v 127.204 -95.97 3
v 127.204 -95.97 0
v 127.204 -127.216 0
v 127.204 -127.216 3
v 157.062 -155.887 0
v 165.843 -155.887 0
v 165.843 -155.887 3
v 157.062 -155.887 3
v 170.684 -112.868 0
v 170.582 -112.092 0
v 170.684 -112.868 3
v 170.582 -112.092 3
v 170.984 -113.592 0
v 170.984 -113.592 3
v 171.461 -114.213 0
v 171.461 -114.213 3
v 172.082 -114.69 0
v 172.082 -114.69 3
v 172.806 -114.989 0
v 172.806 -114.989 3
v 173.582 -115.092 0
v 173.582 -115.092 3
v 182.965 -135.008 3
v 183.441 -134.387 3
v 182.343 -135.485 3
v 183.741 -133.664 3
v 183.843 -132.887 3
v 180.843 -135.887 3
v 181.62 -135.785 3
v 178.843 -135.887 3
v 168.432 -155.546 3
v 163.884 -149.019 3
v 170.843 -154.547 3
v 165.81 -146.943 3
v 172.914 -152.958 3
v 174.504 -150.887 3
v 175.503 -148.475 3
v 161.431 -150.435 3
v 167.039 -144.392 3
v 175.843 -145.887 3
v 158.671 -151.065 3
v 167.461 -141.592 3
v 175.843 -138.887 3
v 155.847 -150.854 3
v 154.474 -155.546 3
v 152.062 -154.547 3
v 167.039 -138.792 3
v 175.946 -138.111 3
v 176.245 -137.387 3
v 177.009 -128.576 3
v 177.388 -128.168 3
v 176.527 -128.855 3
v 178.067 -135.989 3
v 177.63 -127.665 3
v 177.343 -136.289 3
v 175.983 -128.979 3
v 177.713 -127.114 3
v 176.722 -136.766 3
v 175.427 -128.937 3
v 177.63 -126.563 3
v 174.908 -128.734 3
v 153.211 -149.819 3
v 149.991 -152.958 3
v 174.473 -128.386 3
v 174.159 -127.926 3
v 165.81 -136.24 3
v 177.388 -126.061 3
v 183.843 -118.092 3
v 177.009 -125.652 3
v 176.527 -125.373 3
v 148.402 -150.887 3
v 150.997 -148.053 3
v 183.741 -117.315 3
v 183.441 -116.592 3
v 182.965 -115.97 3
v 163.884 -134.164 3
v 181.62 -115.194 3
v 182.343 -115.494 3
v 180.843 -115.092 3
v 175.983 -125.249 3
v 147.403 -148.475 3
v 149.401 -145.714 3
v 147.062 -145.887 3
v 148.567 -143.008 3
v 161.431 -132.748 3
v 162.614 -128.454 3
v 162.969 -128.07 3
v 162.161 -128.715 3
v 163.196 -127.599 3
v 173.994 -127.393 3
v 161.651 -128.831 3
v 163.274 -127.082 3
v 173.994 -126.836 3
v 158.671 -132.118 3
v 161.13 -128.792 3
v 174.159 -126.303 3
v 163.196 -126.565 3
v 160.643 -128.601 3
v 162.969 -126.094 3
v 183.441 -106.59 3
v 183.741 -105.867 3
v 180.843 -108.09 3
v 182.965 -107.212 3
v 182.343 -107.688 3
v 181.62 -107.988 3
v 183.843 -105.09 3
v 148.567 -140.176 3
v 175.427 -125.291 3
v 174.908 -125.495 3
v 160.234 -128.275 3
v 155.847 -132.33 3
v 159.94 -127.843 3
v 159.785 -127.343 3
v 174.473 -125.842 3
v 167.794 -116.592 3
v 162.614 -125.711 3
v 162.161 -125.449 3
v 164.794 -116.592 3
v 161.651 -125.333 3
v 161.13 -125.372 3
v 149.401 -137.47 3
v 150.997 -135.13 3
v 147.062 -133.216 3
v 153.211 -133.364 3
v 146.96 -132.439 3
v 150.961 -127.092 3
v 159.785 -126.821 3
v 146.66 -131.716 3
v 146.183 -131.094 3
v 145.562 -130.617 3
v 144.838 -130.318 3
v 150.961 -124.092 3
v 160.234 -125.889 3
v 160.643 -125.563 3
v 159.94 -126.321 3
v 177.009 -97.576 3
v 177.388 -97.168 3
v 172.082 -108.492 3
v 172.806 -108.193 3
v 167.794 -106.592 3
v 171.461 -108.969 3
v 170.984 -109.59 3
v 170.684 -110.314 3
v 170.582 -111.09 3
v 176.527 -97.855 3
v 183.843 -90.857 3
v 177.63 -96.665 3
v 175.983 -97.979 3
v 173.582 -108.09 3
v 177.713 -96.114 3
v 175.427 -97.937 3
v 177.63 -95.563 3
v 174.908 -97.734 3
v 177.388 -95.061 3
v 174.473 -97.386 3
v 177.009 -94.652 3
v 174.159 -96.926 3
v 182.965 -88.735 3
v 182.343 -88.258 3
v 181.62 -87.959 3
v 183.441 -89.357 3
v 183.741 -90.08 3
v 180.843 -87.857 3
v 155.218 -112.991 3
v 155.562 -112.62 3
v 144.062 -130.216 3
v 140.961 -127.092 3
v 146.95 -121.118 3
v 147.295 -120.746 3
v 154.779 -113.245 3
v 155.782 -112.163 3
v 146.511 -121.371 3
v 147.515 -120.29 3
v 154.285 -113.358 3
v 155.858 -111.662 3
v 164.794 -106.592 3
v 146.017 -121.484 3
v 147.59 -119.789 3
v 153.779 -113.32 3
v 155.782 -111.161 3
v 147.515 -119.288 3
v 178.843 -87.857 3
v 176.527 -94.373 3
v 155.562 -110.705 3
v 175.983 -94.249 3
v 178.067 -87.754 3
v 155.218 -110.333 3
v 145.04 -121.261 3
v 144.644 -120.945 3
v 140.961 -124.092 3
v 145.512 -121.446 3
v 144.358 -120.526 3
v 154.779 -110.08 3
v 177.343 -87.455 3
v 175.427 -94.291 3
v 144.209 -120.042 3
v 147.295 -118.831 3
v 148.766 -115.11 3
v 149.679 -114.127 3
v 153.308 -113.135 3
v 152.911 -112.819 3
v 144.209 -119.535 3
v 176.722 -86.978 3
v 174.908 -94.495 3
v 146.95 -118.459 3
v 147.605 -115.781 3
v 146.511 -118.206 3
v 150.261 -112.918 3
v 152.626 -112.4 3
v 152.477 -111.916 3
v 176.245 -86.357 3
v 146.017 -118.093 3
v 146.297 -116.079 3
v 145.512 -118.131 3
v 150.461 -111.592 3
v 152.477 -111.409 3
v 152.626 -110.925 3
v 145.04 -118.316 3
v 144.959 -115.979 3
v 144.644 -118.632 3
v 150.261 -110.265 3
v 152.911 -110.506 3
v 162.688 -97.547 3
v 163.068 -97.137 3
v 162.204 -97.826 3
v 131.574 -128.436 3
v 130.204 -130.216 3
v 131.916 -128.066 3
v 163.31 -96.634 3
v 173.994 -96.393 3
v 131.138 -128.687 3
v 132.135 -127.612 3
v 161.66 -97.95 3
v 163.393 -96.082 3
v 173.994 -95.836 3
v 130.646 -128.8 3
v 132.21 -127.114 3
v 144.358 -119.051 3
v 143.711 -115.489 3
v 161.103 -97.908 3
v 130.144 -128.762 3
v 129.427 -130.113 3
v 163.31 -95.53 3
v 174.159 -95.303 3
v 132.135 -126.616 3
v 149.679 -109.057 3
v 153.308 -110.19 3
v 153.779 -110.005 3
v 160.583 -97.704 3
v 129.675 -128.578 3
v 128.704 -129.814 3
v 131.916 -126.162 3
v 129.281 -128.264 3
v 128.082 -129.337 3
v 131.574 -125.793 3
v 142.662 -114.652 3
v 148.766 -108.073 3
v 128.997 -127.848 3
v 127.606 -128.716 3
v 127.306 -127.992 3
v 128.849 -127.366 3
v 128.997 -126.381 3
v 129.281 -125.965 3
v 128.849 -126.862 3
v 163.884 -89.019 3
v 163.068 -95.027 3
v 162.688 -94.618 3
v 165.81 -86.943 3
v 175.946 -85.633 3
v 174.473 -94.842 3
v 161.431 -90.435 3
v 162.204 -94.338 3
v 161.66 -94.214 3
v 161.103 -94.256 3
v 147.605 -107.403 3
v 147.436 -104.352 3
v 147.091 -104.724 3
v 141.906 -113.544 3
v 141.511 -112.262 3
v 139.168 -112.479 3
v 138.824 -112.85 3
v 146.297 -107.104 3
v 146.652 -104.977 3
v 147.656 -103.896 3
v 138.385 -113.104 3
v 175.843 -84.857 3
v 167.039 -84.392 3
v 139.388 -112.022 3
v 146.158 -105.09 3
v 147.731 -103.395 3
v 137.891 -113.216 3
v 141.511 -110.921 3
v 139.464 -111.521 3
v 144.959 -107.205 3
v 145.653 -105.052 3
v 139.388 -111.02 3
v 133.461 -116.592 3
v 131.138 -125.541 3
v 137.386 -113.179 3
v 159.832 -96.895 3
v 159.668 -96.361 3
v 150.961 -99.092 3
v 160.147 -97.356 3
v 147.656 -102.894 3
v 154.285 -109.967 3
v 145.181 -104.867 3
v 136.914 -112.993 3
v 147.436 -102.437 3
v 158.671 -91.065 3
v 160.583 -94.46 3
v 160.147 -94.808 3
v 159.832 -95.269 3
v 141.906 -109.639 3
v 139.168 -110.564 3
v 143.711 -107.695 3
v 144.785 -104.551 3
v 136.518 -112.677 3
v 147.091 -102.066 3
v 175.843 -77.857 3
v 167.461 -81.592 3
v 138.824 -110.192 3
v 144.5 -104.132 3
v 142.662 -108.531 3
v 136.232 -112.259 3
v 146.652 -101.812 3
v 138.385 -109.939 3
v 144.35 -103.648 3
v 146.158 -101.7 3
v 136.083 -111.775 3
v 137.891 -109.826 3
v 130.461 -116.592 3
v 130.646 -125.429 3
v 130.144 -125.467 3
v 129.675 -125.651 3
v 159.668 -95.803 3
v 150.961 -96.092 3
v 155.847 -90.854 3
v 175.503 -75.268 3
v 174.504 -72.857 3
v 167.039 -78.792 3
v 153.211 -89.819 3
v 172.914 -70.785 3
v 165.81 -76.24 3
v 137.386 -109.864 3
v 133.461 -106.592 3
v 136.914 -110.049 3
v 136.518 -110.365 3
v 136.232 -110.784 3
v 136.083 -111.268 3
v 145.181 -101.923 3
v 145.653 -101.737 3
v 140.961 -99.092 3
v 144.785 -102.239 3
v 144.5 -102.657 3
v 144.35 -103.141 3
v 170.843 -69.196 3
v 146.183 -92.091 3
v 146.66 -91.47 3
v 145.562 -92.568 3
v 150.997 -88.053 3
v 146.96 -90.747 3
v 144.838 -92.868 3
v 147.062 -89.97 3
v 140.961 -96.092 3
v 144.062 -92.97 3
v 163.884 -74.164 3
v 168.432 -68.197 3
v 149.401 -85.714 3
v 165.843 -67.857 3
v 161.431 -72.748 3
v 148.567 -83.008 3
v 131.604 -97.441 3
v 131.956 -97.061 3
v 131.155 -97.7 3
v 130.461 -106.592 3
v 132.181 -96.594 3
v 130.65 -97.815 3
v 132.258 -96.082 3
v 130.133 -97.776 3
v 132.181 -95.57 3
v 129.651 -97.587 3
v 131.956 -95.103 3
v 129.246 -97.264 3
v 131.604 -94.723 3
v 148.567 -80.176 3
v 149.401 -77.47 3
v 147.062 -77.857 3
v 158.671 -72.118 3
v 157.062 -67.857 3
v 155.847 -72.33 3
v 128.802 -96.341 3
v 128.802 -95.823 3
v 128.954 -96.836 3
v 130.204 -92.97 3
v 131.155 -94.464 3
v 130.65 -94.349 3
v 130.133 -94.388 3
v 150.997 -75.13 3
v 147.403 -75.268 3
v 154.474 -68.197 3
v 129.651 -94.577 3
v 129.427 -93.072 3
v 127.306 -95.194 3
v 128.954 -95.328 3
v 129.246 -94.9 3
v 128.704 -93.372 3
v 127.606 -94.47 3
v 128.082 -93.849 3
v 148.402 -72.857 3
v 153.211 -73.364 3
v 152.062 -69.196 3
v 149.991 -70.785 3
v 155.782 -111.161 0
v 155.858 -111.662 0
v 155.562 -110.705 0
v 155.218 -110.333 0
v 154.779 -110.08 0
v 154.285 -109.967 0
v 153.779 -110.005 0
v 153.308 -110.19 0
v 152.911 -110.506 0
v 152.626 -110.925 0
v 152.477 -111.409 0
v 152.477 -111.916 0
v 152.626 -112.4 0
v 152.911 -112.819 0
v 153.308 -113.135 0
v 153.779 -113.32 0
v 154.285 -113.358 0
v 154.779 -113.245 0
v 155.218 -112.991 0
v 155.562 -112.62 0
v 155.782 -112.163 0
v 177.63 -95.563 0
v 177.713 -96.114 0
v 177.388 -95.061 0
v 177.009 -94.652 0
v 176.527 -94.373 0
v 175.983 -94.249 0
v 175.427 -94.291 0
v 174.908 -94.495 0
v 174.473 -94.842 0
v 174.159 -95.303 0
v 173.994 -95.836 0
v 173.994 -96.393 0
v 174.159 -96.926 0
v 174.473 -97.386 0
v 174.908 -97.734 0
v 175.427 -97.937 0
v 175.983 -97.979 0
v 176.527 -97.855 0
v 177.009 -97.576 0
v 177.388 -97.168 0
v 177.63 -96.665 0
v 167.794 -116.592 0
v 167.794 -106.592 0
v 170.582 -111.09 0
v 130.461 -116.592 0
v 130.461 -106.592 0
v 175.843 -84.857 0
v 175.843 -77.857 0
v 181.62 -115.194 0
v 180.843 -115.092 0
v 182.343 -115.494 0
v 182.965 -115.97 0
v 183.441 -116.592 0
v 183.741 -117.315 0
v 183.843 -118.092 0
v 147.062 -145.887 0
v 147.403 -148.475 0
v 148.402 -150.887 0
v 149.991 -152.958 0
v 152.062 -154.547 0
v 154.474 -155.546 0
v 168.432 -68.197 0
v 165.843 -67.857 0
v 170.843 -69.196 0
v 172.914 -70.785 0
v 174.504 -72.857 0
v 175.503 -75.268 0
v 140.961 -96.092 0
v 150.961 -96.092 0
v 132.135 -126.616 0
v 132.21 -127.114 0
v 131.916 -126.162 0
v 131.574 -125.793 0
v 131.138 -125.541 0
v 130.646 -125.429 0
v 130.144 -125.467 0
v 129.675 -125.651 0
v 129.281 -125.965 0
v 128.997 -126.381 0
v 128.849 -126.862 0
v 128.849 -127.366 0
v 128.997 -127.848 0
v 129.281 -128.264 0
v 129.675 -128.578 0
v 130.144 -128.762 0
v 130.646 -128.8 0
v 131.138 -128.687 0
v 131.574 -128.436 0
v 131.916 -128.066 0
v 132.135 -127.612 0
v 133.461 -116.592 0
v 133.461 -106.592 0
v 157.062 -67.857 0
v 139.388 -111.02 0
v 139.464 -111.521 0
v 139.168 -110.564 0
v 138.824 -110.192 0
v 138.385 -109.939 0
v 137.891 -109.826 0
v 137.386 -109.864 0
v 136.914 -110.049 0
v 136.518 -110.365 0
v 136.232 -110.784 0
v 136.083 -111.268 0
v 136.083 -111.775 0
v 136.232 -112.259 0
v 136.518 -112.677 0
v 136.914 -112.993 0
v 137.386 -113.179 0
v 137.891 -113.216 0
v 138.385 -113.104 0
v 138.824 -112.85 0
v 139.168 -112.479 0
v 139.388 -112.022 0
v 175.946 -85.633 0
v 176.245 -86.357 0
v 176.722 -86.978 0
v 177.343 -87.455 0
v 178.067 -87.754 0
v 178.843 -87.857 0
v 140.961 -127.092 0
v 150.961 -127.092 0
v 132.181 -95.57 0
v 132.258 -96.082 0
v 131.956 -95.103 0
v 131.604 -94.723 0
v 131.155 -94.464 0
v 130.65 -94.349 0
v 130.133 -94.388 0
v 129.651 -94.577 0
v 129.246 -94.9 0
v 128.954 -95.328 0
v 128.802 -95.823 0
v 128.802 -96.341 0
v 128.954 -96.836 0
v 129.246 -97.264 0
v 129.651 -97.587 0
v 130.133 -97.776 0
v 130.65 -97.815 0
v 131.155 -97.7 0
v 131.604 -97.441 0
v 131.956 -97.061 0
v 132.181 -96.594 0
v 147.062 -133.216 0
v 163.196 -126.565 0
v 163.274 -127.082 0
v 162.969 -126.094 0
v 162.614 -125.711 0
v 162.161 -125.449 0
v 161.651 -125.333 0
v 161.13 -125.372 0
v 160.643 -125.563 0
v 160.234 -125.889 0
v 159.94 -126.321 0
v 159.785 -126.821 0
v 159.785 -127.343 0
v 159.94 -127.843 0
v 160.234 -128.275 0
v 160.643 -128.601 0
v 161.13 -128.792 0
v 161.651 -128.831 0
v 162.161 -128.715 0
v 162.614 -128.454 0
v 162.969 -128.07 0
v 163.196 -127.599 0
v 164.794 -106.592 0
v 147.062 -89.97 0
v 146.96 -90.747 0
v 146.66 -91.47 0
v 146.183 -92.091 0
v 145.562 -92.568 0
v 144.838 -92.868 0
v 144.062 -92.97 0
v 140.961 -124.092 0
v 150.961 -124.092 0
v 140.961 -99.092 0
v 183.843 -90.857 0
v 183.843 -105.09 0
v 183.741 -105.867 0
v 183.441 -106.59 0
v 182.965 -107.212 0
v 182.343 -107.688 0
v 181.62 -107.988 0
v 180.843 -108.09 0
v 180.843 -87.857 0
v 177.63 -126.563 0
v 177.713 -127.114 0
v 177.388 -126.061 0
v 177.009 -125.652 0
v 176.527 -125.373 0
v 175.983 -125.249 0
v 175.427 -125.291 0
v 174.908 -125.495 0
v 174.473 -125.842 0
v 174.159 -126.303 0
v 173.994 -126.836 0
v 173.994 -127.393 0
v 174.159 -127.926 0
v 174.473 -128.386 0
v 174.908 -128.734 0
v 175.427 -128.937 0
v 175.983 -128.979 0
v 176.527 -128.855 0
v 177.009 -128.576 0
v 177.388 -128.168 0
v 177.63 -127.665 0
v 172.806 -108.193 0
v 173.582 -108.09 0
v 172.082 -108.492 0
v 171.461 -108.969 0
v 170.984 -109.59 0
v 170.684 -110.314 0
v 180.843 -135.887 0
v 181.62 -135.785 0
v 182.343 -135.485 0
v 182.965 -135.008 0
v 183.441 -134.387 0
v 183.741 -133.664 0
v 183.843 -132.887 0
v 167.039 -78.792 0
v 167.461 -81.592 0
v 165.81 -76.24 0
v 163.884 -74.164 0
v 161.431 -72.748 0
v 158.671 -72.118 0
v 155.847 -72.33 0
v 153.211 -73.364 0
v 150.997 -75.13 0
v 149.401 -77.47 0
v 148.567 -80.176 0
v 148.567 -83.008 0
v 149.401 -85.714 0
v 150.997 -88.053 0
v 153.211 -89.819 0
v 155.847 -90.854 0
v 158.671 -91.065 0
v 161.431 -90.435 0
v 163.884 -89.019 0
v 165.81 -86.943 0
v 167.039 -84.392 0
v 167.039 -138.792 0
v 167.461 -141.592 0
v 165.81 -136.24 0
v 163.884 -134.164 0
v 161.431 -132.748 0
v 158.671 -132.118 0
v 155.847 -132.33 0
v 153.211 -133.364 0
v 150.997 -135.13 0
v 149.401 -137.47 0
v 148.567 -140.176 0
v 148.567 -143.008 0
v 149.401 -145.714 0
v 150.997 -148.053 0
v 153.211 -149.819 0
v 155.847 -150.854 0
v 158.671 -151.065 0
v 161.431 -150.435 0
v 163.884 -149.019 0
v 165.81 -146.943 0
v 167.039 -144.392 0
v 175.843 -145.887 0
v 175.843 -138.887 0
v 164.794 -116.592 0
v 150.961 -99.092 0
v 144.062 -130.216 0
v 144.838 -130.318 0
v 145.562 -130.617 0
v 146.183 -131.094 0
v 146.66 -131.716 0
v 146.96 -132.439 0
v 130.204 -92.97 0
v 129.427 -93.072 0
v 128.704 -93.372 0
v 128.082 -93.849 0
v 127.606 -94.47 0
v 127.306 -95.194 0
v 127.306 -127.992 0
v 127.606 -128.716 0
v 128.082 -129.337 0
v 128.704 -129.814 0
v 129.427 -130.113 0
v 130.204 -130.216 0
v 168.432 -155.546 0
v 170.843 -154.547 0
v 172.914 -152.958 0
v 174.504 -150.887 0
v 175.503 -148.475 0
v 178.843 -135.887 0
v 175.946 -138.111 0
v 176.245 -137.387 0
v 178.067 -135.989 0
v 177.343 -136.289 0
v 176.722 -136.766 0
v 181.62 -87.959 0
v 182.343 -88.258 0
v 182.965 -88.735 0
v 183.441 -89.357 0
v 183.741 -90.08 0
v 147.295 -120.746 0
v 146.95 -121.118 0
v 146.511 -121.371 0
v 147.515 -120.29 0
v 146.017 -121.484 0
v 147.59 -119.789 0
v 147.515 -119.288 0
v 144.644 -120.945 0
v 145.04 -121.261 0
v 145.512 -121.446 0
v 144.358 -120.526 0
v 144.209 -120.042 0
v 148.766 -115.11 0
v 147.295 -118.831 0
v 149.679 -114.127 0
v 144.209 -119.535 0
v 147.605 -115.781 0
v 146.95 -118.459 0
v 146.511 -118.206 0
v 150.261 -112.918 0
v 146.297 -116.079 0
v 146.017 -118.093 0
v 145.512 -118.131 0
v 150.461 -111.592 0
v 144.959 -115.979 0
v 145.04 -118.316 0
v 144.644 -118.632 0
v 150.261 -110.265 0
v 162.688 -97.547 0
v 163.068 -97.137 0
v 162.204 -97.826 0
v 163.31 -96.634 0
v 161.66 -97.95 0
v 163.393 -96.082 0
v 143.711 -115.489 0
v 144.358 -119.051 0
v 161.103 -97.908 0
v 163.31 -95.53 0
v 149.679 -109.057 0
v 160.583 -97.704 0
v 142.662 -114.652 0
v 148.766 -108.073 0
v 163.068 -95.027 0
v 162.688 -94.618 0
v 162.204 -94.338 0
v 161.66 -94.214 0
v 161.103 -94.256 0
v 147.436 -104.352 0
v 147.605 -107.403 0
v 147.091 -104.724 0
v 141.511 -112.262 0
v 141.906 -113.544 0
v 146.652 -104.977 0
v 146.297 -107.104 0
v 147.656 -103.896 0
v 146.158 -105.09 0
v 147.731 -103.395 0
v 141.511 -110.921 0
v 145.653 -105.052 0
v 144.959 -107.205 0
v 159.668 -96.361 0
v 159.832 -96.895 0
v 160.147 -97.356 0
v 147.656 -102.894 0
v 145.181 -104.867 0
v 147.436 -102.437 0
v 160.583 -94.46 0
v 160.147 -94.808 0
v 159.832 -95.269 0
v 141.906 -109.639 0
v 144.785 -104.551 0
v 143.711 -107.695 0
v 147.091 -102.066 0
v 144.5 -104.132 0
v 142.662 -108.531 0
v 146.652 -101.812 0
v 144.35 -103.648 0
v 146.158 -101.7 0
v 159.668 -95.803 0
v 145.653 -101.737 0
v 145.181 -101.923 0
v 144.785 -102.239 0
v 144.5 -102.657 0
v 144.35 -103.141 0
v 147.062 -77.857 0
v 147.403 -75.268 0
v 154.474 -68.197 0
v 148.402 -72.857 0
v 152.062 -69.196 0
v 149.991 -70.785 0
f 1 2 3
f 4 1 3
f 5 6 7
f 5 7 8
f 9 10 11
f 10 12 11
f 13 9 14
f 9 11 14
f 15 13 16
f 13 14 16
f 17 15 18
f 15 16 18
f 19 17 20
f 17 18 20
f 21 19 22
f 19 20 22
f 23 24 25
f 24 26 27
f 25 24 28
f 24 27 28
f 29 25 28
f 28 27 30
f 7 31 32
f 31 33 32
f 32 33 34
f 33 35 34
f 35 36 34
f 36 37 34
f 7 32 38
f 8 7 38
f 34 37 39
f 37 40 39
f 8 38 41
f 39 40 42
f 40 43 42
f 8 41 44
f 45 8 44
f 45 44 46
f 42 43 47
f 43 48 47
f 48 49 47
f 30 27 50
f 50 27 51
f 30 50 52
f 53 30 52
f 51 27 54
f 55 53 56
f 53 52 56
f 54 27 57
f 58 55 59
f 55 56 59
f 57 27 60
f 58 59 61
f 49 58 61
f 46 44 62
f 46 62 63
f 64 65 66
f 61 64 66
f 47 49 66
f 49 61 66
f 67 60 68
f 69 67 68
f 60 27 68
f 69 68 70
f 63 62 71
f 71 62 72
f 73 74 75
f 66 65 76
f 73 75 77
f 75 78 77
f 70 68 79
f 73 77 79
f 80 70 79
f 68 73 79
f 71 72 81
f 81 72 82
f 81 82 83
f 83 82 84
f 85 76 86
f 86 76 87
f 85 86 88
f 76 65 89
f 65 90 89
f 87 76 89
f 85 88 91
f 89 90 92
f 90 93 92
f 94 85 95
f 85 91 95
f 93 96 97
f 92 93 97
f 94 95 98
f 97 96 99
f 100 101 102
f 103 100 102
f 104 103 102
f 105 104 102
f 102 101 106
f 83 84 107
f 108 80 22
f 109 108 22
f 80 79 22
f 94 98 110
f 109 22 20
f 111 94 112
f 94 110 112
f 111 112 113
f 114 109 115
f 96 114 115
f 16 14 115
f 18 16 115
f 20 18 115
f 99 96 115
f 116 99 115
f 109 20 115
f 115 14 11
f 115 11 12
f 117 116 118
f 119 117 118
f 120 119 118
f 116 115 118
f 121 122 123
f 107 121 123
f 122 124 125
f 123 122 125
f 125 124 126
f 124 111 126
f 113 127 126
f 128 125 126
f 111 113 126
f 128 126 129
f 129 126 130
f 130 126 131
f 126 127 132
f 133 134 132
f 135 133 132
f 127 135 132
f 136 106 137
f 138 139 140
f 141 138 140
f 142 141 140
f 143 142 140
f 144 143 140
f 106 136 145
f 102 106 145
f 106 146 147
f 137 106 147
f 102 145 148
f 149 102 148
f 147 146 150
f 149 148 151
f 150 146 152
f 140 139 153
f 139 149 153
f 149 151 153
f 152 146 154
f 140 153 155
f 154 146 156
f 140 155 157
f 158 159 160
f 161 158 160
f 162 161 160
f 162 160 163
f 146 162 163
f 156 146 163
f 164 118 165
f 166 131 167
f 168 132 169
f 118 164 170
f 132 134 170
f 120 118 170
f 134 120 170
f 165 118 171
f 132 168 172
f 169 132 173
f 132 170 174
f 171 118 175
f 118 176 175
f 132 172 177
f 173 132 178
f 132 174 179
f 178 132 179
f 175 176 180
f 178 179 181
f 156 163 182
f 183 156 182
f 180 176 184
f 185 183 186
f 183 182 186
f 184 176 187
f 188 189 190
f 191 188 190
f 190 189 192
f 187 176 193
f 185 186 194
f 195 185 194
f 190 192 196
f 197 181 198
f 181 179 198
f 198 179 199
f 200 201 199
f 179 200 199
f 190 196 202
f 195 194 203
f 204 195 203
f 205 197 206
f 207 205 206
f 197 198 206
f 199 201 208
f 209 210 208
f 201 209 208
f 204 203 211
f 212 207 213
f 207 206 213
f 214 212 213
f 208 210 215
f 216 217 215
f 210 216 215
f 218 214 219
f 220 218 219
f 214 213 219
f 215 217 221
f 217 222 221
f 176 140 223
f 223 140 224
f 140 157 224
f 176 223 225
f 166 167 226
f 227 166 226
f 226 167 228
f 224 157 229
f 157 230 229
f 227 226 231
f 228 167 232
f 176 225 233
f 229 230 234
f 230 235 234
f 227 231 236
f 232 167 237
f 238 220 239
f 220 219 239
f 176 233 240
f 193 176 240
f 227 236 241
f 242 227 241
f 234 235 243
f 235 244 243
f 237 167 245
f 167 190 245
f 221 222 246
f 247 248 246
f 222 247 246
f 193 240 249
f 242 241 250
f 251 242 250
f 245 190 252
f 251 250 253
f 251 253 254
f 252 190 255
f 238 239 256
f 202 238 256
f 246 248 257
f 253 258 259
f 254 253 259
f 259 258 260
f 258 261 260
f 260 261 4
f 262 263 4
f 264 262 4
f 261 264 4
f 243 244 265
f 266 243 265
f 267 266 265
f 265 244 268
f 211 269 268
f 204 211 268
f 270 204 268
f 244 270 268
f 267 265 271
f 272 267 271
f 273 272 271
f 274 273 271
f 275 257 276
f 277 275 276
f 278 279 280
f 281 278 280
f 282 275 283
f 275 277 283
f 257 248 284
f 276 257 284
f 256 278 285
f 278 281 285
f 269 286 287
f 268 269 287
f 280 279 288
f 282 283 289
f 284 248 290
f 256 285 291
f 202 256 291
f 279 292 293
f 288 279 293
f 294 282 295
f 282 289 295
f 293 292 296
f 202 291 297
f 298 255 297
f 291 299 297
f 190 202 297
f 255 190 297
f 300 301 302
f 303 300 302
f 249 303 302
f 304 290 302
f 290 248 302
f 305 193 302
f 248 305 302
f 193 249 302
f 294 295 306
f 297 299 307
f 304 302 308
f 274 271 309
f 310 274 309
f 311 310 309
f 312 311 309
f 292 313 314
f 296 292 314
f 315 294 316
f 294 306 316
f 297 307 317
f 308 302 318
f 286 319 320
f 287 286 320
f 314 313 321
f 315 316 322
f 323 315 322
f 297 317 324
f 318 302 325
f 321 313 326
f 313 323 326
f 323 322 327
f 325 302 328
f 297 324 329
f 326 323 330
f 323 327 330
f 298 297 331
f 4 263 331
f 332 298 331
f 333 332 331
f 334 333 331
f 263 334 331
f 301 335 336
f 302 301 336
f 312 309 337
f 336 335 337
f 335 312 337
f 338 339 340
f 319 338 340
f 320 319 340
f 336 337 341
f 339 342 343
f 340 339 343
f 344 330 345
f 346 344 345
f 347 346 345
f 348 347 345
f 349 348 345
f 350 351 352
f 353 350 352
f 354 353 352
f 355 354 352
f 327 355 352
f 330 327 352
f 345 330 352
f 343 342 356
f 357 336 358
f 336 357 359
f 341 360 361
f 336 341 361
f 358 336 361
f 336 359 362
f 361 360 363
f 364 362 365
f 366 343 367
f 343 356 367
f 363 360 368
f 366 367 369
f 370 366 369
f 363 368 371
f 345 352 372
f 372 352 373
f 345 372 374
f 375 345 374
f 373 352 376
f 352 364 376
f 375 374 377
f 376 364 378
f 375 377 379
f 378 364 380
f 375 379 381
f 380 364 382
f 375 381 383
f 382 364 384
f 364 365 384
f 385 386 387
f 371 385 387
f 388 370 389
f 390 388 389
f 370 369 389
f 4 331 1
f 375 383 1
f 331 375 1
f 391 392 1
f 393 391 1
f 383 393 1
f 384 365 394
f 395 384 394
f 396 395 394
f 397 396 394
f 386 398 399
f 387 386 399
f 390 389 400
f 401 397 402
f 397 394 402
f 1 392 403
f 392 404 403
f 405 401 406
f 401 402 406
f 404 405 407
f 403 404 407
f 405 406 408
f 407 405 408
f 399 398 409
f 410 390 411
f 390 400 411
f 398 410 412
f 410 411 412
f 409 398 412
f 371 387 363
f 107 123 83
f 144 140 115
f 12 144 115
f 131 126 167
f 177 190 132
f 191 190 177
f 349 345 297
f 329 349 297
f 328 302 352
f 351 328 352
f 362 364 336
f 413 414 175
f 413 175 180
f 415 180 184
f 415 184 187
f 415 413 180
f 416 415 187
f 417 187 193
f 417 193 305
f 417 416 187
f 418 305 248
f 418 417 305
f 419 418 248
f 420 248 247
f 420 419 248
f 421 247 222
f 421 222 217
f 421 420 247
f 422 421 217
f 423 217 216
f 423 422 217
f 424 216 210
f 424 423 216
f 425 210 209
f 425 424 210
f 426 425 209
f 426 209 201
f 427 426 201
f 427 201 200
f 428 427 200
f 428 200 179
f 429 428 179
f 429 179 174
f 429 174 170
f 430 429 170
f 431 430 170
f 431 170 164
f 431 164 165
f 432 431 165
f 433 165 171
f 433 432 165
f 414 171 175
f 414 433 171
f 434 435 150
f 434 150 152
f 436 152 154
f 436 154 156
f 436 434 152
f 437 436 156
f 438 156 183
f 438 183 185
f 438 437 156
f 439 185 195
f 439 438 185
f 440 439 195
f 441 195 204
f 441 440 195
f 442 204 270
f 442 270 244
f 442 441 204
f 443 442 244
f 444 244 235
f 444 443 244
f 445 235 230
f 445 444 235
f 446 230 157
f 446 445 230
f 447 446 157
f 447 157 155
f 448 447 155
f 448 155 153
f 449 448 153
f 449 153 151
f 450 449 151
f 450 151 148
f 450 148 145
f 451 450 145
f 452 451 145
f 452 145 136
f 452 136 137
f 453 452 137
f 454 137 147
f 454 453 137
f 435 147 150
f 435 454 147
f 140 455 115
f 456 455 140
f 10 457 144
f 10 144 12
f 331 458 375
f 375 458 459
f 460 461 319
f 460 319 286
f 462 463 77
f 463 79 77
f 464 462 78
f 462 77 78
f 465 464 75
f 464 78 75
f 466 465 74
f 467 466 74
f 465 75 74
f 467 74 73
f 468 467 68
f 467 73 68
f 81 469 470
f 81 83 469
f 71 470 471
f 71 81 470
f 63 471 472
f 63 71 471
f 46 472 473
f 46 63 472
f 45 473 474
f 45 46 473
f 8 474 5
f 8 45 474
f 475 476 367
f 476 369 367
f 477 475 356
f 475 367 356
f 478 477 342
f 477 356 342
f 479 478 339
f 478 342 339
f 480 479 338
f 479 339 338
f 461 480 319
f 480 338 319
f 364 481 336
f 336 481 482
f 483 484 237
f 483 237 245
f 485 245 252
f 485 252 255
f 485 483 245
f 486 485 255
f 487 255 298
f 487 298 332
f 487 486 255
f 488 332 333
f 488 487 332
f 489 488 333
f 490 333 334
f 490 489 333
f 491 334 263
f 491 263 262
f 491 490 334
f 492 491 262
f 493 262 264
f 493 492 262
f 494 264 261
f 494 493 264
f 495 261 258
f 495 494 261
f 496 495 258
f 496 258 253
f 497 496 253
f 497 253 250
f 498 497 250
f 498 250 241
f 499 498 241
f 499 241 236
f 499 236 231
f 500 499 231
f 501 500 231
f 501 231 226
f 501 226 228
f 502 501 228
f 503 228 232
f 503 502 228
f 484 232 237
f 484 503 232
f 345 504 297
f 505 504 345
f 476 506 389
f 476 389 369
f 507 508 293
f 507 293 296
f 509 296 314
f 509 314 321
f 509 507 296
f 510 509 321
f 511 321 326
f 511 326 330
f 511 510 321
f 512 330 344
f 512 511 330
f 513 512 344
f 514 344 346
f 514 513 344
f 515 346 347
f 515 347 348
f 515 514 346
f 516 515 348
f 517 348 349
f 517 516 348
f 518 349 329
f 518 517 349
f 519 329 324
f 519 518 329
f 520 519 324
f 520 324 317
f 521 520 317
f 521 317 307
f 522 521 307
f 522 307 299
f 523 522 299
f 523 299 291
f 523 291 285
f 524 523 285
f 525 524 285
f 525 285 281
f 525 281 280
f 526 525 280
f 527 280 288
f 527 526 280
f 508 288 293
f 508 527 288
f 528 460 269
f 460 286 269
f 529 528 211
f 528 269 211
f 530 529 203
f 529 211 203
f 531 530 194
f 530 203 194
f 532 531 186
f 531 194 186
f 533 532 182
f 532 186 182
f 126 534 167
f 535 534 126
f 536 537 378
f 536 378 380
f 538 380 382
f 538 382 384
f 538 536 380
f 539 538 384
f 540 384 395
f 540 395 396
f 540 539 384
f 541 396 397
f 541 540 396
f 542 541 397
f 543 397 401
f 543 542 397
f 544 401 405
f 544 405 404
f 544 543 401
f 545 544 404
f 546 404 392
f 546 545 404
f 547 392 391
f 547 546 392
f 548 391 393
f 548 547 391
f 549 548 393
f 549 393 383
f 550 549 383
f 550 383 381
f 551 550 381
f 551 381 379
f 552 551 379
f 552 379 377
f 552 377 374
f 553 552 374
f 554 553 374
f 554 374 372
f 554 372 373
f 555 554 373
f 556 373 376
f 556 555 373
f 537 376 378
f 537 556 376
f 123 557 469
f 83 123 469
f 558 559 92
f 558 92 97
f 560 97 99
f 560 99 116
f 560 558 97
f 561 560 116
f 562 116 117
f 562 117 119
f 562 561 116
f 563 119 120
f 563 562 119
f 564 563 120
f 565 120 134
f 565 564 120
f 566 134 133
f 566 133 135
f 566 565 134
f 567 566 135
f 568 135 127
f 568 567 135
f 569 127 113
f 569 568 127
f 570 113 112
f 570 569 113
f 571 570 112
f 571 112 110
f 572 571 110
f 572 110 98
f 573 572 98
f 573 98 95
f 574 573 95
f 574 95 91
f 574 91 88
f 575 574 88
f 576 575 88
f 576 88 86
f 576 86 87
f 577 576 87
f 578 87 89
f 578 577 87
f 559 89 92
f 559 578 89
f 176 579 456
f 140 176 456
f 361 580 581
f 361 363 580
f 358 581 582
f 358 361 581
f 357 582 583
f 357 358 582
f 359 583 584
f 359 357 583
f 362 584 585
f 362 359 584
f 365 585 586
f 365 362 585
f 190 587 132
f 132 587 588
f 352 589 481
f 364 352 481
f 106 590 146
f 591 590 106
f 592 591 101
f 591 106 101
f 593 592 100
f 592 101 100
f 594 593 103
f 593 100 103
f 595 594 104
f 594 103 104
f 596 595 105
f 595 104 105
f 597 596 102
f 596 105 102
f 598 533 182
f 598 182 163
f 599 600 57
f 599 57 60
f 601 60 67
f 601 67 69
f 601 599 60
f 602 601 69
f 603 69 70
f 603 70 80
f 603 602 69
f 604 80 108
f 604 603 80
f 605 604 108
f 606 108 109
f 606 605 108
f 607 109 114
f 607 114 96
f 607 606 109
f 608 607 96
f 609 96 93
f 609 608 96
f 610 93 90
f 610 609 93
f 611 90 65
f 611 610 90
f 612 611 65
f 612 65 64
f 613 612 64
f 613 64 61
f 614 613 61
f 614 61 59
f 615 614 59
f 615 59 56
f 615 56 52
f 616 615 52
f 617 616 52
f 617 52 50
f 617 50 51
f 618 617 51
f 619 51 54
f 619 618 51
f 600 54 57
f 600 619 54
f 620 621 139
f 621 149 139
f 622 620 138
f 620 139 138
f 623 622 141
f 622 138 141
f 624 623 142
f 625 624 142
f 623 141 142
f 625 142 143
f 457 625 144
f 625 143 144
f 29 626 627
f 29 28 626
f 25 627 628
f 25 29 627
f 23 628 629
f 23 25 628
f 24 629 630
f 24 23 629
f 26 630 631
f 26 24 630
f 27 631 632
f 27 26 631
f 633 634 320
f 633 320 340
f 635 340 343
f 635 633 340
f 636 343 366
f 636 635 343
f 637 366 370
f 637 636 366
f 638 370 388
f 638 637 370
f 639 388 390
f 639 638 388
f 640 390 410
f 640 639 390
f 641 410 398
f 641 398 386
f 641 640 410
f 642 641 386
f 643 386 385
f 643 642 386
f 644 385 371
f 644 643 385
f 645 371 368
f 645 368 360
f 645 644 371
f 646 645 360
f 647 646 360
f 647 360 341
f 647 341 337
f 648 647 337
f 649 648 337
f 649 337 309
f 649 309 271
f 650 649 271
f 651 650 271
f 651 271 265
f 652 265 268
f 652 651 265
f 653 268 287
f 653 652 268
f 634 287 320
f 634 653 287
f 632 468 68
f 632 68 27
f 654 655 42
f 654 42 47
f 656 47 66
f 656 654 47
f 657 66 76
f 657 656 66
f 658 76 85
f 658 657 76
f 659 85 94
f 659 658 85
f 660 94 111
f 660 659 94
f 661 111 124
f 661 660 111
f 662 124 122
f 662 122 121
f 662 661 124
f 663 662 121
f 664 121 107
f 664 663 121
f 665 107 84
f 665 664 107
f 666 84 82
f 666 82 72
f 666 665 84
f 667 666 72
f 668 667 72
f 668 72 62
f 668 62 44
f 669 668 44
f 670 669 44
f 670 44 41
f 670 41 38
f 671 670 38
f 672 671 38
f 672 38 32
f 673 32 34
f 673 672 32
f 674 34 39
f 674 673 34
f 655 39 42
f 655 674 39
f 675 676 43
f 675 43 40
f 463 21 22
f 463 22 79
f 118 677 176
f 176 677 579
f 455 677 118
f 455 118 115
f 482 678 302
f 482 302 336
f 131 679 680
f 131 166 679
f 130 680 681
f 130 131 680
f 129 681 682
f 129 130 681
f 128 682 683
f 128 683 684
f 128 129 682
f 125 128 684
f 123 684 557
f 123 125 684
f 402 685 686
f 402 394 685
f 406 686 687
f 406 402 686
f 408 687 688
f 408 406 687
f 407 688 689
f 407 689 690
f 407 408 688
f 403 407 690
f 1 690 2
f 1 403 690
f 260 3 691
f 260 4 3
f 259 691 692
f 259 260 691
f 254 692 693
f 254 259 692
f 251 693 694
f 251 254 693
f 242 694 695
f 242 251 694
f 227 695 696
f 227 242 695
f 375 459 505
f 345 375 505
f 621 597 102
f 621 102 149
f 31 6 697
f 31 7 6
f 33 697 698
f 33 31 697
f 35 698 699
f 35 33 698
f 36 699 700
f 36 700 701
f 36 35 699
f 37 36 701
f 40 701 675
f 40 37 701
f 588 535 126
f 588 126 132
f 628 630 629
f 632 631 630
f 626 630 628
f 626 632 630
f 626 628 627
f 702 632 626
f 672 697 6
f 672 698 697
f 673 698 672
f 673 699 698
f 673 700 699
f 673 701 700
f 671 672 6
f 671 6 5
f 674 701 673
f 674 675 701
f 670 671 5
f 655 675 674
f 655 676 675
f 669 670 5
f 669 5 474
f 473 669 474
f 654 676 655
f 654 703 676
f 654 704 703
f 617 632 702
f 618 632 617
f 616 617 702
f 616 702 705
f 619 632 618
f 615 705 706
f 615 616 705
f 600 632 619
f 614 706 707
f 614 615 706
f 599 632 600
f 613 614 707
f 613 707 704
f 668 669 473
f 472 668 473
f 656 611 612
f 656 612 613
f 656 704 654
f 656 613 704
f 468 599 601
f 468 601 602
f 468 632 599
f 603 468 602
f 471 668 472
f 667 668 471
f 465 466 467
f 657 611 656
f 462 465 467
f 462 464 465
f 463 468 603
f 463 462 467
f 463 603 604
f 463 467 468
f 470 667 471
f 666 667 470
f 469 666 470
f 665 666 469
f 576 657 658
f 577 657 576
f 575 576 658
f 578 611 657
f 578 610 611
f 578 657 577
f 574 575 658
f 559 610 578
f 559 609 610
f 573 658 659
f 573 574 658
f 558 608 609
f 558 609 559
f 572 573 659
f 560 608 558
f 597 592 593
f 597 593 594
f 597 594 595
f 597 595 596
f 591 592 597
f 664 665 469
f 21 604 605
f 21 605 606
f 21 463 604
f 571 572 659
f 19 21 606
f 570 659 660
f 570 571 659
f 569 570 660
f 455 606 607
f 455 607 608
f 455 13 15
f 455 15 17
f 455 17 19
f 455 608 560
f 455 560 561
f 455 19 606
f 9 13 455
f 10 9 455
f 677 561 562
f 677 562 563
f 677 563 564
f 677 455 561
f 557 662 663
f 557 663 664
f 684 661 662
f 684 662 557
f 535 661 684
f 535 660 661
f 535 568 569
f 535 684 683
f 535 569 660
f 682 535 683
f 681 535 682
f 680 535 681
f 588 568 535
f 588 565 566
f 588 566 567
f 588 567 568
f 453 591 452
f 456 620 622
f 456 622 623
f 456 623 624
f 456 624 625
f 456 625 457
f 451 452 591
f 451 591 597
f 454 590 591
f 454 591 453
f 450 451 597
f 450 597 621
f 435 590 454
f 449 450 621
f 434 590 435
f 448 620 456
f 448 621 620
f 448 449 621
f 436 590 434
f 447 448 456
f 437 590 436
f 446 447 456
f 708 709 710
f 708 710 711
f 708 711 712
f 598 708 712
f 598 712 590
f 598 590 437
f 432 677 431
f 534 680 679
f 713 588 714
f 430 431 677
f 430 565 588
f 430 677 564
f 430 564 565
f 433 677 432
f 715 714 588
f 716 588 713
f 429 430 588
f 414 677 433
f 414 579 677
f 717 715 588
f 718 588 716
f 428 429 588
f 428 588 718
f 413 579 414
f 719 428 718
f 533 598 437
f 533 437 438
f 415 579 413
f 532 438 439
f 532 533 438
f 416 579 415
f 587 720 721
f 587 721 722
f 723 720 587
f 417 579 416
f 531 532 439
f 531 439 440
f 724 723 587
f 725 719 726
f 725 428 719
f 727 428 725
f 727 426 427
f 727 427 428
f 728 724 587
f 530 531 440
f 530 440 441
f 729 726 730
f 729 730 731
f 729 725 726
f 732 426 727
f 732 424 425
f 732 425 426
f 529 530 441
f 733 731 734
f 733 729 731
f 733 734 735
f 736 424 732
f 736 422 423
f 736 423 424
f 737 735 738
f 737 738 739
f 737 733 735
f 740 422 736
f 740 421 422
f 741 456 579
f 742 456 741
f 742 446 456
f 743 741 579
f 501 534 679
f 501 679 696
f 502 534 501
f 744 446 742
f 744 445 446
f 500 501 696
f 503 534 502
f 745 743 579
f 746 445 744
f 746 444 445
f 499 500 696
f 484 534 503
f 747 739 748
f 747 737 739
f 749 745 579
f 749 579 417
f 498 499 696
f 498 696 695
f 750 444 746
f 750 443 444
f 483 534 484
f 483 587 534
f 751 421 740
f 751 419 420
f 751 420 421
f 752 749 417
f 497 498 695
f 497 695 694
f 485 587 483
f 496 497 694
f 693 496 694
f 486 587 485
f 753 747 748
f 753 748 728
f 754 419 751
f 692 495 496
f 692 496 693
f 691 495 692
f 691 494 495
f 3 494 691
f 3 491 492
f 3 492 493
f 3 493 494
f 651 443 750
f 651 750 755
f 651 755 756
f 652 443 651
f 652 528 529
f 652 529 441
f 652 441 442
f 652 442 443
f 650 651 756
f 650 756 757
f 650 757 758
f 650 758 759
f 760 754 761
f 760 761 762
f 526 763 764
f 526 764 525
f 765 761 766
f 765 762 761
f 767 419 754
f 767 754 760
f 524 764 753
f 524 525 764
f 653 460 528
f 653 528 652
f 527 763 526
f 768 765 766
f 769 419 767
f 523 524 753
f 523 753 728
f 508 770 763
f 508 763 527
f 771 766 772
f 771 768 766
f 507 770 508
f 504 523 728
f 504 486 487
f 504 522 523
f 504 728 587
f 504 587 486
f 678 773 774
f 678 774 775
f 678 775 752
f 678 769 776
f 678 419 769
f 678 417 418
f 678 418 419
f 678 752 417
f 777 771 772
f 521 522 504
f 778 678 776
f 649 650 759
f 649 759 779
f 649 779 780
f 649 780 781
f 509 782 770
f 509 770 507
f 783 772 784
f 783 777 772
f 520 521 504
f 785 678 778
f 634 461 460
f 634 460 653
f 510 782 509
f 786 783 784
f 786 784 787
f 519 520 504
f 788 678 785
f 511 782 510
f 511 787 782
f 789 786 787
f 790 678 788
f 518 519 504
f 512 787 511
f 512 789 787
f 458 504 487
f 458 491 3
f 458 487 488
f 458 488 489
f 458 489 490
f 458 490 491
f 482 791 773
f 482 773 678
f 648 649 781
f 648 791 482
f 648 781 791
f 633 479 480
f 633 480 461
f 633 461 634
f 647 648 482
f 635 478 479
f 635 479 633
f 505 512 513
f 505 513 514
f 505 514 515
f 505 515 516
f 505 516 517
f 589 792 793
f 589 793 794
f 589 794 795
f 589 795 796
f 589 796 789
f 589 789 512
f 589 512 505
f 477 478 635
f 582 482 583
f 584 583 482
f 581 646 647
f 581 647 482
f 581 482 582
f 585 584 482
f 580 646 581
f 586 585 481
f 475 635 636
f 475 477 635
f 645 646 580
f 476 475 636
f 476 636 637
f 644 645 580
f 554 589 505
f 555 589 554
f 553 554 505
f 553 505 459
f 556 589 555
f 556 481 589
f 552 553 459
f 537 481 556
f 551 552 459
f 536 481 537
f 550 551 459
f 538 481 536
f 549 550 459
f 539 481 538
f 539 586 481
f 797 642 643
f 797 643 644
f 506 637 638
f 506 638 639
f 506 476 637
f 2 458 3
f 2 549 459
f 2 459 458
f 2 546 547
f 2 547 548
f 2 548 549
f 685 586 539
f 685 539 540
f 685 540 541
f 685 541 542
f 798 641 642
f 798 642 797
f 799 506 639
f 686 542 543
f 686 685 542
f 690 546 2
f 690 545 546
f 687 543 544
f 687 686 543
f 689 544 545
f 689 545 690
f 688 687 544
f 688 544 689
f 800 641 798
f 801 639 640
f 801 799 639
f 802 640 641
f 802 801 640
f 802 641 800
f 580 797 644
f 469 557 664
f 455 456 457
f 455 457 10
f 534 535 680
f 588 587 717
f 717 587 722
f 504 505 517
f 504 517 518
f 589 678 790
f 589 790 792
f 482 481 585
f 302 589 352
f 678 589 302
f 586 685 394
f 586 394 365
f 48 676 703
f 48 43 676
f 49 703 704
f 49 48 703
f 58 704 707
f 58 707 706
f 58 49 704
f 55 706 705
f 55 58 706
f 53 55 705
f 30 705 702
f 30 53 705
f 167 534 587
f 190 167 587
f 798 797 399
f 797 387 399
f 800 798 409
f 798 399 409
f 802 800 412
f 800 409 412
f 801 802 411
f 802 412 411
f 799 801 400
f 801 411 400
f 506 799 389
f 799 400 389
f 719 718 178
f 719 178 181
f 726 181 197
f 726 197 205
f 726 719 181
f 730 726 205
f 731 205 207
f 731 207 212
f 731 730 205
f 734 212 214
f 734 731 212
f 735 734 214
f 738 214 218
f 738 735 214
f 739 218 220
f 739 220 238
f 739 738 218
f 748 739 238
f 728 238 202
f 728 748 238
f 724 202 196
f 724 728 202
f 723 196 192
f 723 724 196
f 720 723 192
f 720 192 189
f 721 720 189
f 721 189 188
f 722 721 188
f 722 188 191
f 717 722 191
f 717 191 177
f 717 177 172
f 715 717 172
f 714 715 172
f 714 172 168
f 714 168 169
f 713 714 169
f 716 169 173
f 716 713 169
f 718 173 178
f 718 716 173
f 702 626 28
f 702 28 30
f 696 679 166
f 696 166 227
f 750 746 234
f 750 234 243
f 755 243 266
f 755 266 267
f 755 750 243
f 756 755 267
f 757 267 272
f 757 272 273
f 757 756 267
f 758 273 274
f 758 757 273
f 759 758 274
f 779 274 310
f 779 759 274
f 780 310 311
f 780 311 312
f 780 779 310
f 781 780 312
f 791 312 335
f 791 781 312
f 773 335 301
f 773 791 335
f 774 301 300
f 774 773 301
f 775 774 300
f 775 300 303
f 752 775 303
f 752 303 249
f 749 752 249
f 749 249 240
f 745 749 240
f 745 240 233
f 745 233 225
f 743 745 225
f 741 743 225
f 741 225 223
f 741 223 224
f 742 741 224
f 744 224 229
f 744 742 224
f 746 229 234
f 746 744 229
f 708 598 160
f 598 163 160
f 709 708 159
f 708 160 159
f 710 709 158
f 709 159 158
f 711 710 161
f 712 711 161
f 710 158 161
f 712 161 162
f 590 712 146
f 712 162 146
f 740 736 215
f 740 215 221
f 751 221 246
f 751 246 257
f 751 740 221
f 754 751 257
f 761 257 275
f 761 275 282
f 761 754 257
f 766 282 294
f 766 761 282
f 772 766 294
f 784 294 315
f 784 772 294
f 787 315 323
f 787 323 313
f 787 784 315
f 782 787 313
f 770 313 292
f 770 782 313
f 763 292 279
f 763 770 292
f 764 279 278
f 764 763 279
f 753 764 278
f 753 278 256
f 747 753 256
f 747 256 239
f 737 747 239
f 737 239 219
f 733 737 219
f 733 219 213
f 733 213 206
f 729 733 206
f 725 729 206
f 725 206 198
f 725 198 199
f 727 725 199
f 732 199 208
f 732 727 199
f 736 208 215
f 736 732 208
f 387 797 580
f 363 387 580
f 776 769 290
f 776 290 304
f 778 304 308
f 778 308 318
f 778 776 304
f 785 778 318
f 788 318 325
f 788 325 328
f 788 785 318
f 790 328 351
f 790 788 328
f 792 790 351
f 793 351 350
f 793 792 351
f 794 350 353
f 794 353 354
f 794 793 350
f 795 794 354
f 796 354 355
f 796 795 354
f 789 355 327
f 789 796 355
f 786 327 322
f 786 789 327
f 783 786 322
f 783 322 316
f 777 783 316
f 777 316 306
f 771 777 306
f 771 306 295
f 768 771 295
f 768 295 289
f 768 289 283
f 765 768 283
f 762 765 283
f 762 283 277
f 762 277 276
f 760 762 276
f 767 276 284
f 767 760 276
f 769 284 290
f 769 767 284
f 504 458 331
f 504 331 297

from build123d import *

# Parameters (mm, degrees)
SKETCH1_R           = 1.737885662
SKETCH1_R_2         = 1.873200063
SKETCH1_R_3         = 1.690089146
SKETCH1_R_4         = 1.754205974
SKETCH1_R_5         = 1.7
SKETCH1_R_6         = 4.5
SKETCH1_R_7         = 1.87
SKETCH1_R_8         = 9.5
SKETCH1_W           = 3
SKETCH1_H           = 10
SKETCH1_W_2         = 10
SKETCH1_H_2         = 3
BOSS_EXTRUDE1_DEPTH = 3
FILLET1_R           = 10
FILLET2_R           = 3


with BuildPart() as part:
    # Sketch1 → Boss-Extrude1 (new body)
    with BuildSketch(Plane.XY):
        Polygon((147.061964125, -92.970138098), (147.061964125, -71.856515964), (147.061964125, -67.856515964), (175.843347401, -67.856515964), (175.843347401, -87.856515964), (183.843347401, -87.856515964), (183.843347401, -108.090292187), (170.582125914, -108.090292187), (170.582125914, -115.091712302), (183.843347401, -115.091712302), (183.843347401, -135.887076434), (175.843347401, -135.887076434), (175.843347401, -155.887076434), (147.061964125, -155.887076434), (147.061964125, -151.887076434), (147.061964125, -130.215533927), (127.203791419, -130.215533927), (127.203791419, -111.591712302), (127.203791419, -92.970138098), align=None)
        with Locations((130.520049527, -96.082032258)):
            Circle(SKETCH1_R, mode=Mode.SUBTRACT)
        with Locations((161.520049527, -96.082032258)):
            Circle(SKETCH1_R_2, mode=Mode.SUBTRACT)
        with Locations((130.520049527, -127.114221831)):
            Circle(SKETCH1_R_3, mode=Mode.SUBTRACT)
        with Locations((161.520049527, -127.082032258)):
            Circle(SKETCH1_R_4, mode=Mode.SUBTRACT)
        with Locations((154.157584865, -111.662272701)):
            Circle(SKETCH1_R_5, mode=Mode.SUBTRACT)
        with Locations((145.89014032, -119.788596448)):
            Circle(SKETCH1_R_5, mode=Mode.SUBTRACT)
        with Locations((137.763816574, -111.521151903)):
            Circle(SKETCH1_R_5, mode=Mode.SUBTRACT)
        with Locations((146.031261118, -103.394828157)):
            Circle(SKETCH1_R_5, mode=Mode.SUBTRACT)
        with Locations((145.960700719, -111.591712302)):
            Circle(SKETCH1_R_6, mode=Mode.SUBTRACT)
        with Locations((175.843347401, -96.114221831)):
            Circle(SKETCH1_R_7, mode=Mode.SUBTRACT)
        with Locations((157.960700719, -81.591712302)):
            Circle(SKETCH1_R_8, mode=Mode.SUBTRACT)
        with Locations((157.960700719, -141.591712302)):
            Circle(SKETCH1_R_8, mode=Mode.SUBTRACT)
        with Locations((175.843347401, -127.114221831)):
            Circle(SKETCH1_R_7, mode=Mode.SUBTRACT)
        with Locations((131.960700719, -111.591712302)):
            Rectangle(SKETCH1_W, SKETCH1_H, mode=Mode.SUBTRACT)
        with Locations((145.960700719, -97.591712302)):
            Rectangle(SKETCH1_W_2, SKETCH1_H_2, mode=Mode.SUBTRACT)
        with Locations((145.960700719, -125.591712302)):
            Rectangle(SKETCH1_W_2, SKETCH1_H_2, mode=Mode.SUBTRACT)
        with Locations((166.293610901, -111.591712302)):
            Rectangle(SKETCH1_W, SKETCH1_H, mode=Mode.SUBTRACT)
    extrude(amount=BOSS_EXTRUDE1_DEPTH)

    # Fillet1
    fillet1_edges = [part.edges().sort_by_distance(p)[0] for p in [
        (147.061964125, -67.856515964, 1.5),
        (175.843347401, -67.856515964, 1.5),
        (175.843347401, -155.887076434, 1.5),
        (147.061964125, -155.887076434, 1.5),
    ]]
    fillet(fillet1_edges, radius=FILLET1_R)

    # Fillet2
    fillet2_edges = [part.edges().sort_by_distance(p)[0] for p in [
        (175.843347401, -87.856515964, 1.5),
        (183.843347401, -87.856515964, 1.5),
        (183.843347401, -108.090292187, 1.5),
        (170.582125914, -108.090292187, 1.5),
        (170.582125914, -115.091712302, 1.5),
        (183.843347401, -115.091712302, 1.5),
        (183.843347401, -135.887076434, 1.5),
        (175.843347401, -135.887076434, 1.5),
        (147.061964125, -130.215533927, 1.5),
        (127.203791419, -130.215533927, 1.5),
        (127.203791419, -92.970138098, 1.5),
        (147.061964125, -92.970138098, 1.5),
    ]]
    fillet(fillet2_edges, radius=FILLET2_R)


solid = part.part
